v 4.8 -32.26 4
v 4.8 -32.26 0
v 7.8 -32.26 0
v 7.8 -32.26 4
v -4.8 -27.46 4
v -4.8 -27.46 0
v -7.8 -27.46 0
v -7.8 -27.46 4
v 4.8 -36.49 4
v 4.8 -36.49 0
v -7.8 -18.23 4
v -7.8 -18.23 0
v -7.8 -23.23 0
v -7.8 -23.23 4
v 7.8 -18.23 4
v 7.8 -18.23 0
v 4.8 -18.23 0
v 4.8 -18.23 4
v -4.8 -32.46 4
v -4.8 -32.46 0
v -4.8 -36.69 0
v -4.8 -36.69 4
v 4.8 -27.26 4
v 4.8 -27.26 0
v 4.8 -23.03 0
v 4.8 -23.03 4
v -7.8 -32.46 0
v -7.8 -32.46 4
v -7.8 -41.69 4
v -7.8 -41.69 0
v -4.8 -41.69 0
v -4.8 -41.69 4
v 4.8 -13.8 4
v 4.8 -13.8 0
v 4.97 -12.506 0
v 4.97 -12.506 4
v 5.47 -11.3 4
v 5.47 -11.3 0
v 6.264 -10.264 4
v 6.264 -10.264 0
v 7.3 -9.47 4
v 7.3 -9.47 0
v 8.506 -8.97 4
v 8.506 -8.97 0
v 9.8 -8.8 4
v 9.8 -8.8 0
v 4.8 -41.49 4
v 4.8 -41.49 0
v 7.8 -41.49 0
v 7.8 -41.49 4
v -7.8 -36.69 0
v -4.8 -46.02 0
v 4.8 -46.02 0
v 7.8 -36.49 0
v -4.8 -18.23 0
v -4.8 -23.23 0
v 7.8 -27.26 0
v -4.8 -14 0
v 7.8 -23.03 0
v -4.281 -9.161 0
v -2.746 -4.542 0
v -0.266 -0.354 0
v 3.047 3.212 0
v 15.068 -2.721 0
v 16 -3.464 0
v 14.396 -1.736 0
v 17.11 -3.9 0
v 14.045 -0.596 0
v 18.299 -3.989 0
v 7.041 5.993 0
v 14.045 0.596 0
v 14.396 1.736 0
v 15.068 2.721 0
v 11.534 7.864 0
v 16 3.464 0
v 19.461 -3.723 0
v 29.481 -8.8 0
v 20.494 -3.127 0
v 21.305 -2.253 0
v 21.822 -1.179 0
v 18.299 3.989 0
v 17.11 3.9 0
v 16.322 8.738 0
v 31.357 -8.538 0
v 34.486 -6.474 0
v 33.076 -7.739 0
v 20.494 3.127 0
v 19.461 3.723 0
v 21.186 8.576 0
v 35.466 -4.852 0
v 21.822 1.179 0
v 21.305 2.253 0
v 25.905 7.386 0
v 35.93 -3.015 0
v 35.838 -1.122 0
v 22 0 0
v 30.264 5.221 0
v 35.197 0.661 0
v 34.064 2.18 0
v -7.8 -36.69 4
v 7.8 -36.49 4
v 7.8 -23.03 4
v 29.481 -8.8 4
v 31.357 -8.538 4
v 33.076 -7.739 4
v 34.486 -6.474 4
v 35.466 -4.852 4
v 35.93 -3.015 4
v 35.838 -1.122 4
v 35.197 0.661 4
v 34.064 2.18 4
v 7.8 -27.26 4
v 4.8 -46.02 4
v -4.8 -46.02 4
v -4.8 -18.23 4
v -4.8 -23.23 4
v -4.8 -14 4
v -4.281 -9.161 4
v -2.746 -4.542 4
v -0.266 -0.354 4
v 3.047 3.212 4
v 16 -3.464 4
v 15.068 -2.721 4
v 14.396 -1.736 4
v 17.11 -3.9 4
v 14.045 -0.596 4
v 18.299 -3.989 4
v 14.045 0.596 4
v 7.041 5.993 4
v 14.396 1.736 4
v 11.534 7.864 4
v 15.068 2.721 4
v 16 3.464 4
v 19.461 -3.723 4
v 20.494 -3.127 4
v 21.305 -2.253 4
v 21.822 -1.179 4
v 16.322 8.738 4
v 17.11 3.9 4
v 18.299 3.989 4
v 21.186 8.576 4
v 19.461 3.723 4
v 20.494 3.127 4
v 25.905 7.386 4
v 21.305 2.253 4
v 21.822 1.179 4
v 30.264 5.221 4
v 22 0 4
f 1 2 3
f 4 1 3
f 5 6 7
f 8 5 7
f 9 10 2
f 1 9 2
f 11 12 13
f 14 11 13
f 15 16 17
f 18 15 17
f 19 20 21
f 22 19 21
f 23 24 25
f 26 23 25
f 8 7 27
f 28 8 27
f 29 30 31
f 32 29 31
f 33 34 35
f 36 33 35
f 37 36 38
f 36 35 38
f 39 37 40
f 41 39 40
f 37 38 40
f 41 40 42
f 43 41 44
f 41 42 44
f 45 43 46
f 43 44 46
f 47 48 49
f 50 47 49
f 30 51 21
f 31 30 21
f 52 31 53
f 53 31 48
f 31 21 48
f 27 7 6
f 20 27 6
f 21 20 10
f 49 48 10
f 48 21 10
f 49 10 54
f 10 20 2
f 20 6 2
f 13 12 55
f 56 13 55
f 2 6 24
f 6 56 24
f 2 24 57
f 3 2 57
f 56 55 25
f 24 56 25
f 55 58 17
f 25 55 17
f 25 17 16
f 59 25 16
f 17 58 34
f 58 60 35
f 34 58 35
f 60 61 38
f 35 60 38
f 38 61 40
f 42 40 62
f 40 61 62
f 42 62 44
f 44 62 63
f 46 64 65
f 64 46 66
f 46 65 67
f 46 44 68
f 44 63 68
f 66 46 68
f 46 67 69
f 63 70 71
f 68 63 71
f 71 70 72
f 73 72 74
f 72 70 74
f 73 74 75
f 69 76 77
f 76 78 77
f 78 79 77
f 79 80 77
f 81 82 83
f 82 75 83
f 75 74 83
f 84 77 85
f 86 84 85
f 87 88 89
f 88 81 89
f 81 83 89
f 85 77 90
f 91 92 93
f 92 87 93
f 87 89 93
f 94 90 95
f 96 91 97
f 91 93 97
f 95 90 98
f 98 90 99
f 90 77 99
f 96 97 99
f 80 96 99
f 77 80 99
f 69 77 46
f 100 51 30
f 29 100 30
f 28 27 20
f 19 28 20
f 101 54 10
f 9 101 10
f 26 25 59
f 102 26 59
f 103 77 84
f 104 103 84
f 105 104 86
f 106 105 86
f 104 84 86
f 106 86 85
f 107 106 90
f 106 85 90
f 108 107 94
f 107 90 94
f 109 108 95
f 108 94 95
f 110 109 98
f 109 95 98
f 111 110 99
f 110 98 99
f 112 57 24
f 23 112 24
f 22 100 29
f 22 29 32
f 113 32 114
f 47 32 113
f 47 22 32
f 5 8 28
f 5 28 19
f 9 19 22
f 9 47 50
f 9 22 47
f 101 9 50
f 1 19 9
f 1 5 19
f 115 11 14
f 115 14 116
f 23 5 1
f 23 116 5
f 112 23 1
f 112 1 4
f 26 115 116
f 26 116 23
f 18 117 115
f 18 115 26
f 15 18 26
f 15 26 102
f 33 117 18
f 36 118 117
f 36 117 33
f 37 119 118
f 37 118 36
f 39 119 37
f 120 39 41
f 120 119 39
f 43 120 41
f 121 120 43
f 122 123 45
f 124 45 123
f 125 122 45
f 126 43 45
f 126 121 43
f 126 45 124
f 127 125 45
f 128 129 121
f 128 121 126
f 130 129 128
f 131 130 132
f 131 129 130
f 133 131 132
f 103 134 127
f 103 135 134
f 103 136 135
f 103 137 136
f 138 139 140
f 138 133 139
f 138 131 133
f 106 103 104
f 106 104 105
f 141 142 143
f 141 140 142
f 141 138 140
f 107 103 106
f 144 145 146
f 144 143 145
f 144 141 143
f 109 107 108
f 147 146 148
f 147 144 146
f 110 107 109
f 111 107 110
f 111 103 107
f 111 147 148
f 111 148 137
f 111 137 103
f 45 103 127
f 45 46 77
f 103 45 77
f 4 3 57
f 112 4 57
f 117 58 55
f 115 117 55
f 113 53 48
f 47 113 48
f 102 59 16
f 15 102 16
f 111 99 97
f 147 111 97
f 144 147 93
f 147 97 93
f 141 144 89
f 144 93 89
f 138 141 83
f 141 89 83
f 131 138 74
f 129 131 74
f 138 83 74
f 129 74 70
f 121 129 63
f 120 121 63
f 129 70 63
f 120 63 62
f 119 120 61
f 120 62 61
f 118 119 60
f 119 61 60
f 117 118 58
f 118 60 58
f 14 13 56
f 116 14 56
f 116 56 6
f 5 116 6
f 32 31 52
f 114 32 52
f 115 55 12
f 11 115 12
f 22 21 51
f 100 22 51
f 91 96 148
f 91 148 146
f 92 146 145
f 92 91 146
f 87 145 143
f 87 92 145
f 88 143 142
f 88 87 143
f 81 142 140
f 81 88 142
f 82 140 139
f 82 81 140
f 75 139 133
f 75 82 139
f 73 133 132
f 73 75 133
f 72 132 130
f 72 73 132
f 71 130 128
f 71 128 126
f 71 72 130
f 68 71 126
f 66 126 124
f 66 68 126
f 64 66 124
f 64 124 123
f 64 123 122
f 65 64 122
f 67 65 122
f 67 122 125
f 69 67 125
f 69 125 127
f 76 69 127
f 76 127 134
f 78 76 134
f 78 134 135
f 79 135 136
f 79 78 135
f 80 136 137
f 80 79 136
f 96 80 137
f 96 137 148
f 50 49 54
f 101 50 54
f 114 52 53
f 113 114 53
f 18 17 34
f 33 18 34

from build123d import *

# Parameters (mm, degrees)
SKETCH_1_R      = 4
EXTRUDE_1_DEPTH = 4


with BuildPart() as part:
    # 草图1 → 凸台-拉伸1 (new body)
    with BuildSketch(Plane.XY):
        with BuildLine():
            ThreePointArc((34.064306358, 2.179556892), (9.237186096, 7.048826392), (-4.8, -14))
            Line((-4.8, -14), (-4.8, -18.23))
            Line((-4.8, -18.23), (-7.8, -18.23))
            Line((-7.8, -18.23), (-7.8, -23.23))
            Line((-7.8, -23.23), (-4.8, -23.23))
            Line((-4.8, -23.23), (-4.8, -27.46))
            Line((-4.8, -27.46), (-7.8, -27.46))
            Line((-7.8, -27.46), (-7.8, -32.46))
            Line((-7.8, -32.46), (-4.8, -32.46))
            Line((-4.8, -32.46), (-4.8, -36.69))
            Line((-4.8, -36.69), (-7.8, -36.69))
            Line((-7.8, -36.69), (-7.8, -41.69))
            Line((-7.8, -41.69), (-4.8, -41.69))
            Line((-4.8, -41.69), (-4.8, -46.02))
            Line((-4.8, -46.02), (4.8, -46.02))
            Line((4.8, -46.02), (4.8, -41.49))
            Line((4.8, -41.49), (7.8, -41.49))
            Line((7.8, -41.49), (7.8, -36.49))
            Line((7.8, -36.49), (4.8, -36.49))
            Line((4.8, -36.49), (4.8, -32.26))
            Line((4.8, -32.26), (7.8, -32.26))
            Line((7.8, -32.26), (7.8, -27.26))
            Line((7.8, -27.26), (4.8, -27.26))
            Line((4.8, -27.26), (4.8, -23.03))
            Line((4.8, -23.03), (7.8, -23.03))
            Line((7.8, -23.03), (7.8, -18.23))
            Line((7.8, -18.23), (4.8, -18.23))
            Line((4.8, -18.23), (4.8, -13.8))
            ThreePointArc((4.8, -13.8), (6.264466094, -10.264466094), (9.8, -8.8))
            Line((9.8, -8.8), (18, -8.8))
            Line((18, -8.8), (29.480940848, -8.8))
            ThreePointArc((29.480940848, -8.8), (35.465961002, -4.851988259), (34.064306358, 2.179556892))
        make_face()
        with Locations((18, 0)):
            Circle(SKETCH_1_R, mode=Mode.SUBTRACT)
    extrude(amount=EXTRUDE_1_DEPTH)


solid = part.part
